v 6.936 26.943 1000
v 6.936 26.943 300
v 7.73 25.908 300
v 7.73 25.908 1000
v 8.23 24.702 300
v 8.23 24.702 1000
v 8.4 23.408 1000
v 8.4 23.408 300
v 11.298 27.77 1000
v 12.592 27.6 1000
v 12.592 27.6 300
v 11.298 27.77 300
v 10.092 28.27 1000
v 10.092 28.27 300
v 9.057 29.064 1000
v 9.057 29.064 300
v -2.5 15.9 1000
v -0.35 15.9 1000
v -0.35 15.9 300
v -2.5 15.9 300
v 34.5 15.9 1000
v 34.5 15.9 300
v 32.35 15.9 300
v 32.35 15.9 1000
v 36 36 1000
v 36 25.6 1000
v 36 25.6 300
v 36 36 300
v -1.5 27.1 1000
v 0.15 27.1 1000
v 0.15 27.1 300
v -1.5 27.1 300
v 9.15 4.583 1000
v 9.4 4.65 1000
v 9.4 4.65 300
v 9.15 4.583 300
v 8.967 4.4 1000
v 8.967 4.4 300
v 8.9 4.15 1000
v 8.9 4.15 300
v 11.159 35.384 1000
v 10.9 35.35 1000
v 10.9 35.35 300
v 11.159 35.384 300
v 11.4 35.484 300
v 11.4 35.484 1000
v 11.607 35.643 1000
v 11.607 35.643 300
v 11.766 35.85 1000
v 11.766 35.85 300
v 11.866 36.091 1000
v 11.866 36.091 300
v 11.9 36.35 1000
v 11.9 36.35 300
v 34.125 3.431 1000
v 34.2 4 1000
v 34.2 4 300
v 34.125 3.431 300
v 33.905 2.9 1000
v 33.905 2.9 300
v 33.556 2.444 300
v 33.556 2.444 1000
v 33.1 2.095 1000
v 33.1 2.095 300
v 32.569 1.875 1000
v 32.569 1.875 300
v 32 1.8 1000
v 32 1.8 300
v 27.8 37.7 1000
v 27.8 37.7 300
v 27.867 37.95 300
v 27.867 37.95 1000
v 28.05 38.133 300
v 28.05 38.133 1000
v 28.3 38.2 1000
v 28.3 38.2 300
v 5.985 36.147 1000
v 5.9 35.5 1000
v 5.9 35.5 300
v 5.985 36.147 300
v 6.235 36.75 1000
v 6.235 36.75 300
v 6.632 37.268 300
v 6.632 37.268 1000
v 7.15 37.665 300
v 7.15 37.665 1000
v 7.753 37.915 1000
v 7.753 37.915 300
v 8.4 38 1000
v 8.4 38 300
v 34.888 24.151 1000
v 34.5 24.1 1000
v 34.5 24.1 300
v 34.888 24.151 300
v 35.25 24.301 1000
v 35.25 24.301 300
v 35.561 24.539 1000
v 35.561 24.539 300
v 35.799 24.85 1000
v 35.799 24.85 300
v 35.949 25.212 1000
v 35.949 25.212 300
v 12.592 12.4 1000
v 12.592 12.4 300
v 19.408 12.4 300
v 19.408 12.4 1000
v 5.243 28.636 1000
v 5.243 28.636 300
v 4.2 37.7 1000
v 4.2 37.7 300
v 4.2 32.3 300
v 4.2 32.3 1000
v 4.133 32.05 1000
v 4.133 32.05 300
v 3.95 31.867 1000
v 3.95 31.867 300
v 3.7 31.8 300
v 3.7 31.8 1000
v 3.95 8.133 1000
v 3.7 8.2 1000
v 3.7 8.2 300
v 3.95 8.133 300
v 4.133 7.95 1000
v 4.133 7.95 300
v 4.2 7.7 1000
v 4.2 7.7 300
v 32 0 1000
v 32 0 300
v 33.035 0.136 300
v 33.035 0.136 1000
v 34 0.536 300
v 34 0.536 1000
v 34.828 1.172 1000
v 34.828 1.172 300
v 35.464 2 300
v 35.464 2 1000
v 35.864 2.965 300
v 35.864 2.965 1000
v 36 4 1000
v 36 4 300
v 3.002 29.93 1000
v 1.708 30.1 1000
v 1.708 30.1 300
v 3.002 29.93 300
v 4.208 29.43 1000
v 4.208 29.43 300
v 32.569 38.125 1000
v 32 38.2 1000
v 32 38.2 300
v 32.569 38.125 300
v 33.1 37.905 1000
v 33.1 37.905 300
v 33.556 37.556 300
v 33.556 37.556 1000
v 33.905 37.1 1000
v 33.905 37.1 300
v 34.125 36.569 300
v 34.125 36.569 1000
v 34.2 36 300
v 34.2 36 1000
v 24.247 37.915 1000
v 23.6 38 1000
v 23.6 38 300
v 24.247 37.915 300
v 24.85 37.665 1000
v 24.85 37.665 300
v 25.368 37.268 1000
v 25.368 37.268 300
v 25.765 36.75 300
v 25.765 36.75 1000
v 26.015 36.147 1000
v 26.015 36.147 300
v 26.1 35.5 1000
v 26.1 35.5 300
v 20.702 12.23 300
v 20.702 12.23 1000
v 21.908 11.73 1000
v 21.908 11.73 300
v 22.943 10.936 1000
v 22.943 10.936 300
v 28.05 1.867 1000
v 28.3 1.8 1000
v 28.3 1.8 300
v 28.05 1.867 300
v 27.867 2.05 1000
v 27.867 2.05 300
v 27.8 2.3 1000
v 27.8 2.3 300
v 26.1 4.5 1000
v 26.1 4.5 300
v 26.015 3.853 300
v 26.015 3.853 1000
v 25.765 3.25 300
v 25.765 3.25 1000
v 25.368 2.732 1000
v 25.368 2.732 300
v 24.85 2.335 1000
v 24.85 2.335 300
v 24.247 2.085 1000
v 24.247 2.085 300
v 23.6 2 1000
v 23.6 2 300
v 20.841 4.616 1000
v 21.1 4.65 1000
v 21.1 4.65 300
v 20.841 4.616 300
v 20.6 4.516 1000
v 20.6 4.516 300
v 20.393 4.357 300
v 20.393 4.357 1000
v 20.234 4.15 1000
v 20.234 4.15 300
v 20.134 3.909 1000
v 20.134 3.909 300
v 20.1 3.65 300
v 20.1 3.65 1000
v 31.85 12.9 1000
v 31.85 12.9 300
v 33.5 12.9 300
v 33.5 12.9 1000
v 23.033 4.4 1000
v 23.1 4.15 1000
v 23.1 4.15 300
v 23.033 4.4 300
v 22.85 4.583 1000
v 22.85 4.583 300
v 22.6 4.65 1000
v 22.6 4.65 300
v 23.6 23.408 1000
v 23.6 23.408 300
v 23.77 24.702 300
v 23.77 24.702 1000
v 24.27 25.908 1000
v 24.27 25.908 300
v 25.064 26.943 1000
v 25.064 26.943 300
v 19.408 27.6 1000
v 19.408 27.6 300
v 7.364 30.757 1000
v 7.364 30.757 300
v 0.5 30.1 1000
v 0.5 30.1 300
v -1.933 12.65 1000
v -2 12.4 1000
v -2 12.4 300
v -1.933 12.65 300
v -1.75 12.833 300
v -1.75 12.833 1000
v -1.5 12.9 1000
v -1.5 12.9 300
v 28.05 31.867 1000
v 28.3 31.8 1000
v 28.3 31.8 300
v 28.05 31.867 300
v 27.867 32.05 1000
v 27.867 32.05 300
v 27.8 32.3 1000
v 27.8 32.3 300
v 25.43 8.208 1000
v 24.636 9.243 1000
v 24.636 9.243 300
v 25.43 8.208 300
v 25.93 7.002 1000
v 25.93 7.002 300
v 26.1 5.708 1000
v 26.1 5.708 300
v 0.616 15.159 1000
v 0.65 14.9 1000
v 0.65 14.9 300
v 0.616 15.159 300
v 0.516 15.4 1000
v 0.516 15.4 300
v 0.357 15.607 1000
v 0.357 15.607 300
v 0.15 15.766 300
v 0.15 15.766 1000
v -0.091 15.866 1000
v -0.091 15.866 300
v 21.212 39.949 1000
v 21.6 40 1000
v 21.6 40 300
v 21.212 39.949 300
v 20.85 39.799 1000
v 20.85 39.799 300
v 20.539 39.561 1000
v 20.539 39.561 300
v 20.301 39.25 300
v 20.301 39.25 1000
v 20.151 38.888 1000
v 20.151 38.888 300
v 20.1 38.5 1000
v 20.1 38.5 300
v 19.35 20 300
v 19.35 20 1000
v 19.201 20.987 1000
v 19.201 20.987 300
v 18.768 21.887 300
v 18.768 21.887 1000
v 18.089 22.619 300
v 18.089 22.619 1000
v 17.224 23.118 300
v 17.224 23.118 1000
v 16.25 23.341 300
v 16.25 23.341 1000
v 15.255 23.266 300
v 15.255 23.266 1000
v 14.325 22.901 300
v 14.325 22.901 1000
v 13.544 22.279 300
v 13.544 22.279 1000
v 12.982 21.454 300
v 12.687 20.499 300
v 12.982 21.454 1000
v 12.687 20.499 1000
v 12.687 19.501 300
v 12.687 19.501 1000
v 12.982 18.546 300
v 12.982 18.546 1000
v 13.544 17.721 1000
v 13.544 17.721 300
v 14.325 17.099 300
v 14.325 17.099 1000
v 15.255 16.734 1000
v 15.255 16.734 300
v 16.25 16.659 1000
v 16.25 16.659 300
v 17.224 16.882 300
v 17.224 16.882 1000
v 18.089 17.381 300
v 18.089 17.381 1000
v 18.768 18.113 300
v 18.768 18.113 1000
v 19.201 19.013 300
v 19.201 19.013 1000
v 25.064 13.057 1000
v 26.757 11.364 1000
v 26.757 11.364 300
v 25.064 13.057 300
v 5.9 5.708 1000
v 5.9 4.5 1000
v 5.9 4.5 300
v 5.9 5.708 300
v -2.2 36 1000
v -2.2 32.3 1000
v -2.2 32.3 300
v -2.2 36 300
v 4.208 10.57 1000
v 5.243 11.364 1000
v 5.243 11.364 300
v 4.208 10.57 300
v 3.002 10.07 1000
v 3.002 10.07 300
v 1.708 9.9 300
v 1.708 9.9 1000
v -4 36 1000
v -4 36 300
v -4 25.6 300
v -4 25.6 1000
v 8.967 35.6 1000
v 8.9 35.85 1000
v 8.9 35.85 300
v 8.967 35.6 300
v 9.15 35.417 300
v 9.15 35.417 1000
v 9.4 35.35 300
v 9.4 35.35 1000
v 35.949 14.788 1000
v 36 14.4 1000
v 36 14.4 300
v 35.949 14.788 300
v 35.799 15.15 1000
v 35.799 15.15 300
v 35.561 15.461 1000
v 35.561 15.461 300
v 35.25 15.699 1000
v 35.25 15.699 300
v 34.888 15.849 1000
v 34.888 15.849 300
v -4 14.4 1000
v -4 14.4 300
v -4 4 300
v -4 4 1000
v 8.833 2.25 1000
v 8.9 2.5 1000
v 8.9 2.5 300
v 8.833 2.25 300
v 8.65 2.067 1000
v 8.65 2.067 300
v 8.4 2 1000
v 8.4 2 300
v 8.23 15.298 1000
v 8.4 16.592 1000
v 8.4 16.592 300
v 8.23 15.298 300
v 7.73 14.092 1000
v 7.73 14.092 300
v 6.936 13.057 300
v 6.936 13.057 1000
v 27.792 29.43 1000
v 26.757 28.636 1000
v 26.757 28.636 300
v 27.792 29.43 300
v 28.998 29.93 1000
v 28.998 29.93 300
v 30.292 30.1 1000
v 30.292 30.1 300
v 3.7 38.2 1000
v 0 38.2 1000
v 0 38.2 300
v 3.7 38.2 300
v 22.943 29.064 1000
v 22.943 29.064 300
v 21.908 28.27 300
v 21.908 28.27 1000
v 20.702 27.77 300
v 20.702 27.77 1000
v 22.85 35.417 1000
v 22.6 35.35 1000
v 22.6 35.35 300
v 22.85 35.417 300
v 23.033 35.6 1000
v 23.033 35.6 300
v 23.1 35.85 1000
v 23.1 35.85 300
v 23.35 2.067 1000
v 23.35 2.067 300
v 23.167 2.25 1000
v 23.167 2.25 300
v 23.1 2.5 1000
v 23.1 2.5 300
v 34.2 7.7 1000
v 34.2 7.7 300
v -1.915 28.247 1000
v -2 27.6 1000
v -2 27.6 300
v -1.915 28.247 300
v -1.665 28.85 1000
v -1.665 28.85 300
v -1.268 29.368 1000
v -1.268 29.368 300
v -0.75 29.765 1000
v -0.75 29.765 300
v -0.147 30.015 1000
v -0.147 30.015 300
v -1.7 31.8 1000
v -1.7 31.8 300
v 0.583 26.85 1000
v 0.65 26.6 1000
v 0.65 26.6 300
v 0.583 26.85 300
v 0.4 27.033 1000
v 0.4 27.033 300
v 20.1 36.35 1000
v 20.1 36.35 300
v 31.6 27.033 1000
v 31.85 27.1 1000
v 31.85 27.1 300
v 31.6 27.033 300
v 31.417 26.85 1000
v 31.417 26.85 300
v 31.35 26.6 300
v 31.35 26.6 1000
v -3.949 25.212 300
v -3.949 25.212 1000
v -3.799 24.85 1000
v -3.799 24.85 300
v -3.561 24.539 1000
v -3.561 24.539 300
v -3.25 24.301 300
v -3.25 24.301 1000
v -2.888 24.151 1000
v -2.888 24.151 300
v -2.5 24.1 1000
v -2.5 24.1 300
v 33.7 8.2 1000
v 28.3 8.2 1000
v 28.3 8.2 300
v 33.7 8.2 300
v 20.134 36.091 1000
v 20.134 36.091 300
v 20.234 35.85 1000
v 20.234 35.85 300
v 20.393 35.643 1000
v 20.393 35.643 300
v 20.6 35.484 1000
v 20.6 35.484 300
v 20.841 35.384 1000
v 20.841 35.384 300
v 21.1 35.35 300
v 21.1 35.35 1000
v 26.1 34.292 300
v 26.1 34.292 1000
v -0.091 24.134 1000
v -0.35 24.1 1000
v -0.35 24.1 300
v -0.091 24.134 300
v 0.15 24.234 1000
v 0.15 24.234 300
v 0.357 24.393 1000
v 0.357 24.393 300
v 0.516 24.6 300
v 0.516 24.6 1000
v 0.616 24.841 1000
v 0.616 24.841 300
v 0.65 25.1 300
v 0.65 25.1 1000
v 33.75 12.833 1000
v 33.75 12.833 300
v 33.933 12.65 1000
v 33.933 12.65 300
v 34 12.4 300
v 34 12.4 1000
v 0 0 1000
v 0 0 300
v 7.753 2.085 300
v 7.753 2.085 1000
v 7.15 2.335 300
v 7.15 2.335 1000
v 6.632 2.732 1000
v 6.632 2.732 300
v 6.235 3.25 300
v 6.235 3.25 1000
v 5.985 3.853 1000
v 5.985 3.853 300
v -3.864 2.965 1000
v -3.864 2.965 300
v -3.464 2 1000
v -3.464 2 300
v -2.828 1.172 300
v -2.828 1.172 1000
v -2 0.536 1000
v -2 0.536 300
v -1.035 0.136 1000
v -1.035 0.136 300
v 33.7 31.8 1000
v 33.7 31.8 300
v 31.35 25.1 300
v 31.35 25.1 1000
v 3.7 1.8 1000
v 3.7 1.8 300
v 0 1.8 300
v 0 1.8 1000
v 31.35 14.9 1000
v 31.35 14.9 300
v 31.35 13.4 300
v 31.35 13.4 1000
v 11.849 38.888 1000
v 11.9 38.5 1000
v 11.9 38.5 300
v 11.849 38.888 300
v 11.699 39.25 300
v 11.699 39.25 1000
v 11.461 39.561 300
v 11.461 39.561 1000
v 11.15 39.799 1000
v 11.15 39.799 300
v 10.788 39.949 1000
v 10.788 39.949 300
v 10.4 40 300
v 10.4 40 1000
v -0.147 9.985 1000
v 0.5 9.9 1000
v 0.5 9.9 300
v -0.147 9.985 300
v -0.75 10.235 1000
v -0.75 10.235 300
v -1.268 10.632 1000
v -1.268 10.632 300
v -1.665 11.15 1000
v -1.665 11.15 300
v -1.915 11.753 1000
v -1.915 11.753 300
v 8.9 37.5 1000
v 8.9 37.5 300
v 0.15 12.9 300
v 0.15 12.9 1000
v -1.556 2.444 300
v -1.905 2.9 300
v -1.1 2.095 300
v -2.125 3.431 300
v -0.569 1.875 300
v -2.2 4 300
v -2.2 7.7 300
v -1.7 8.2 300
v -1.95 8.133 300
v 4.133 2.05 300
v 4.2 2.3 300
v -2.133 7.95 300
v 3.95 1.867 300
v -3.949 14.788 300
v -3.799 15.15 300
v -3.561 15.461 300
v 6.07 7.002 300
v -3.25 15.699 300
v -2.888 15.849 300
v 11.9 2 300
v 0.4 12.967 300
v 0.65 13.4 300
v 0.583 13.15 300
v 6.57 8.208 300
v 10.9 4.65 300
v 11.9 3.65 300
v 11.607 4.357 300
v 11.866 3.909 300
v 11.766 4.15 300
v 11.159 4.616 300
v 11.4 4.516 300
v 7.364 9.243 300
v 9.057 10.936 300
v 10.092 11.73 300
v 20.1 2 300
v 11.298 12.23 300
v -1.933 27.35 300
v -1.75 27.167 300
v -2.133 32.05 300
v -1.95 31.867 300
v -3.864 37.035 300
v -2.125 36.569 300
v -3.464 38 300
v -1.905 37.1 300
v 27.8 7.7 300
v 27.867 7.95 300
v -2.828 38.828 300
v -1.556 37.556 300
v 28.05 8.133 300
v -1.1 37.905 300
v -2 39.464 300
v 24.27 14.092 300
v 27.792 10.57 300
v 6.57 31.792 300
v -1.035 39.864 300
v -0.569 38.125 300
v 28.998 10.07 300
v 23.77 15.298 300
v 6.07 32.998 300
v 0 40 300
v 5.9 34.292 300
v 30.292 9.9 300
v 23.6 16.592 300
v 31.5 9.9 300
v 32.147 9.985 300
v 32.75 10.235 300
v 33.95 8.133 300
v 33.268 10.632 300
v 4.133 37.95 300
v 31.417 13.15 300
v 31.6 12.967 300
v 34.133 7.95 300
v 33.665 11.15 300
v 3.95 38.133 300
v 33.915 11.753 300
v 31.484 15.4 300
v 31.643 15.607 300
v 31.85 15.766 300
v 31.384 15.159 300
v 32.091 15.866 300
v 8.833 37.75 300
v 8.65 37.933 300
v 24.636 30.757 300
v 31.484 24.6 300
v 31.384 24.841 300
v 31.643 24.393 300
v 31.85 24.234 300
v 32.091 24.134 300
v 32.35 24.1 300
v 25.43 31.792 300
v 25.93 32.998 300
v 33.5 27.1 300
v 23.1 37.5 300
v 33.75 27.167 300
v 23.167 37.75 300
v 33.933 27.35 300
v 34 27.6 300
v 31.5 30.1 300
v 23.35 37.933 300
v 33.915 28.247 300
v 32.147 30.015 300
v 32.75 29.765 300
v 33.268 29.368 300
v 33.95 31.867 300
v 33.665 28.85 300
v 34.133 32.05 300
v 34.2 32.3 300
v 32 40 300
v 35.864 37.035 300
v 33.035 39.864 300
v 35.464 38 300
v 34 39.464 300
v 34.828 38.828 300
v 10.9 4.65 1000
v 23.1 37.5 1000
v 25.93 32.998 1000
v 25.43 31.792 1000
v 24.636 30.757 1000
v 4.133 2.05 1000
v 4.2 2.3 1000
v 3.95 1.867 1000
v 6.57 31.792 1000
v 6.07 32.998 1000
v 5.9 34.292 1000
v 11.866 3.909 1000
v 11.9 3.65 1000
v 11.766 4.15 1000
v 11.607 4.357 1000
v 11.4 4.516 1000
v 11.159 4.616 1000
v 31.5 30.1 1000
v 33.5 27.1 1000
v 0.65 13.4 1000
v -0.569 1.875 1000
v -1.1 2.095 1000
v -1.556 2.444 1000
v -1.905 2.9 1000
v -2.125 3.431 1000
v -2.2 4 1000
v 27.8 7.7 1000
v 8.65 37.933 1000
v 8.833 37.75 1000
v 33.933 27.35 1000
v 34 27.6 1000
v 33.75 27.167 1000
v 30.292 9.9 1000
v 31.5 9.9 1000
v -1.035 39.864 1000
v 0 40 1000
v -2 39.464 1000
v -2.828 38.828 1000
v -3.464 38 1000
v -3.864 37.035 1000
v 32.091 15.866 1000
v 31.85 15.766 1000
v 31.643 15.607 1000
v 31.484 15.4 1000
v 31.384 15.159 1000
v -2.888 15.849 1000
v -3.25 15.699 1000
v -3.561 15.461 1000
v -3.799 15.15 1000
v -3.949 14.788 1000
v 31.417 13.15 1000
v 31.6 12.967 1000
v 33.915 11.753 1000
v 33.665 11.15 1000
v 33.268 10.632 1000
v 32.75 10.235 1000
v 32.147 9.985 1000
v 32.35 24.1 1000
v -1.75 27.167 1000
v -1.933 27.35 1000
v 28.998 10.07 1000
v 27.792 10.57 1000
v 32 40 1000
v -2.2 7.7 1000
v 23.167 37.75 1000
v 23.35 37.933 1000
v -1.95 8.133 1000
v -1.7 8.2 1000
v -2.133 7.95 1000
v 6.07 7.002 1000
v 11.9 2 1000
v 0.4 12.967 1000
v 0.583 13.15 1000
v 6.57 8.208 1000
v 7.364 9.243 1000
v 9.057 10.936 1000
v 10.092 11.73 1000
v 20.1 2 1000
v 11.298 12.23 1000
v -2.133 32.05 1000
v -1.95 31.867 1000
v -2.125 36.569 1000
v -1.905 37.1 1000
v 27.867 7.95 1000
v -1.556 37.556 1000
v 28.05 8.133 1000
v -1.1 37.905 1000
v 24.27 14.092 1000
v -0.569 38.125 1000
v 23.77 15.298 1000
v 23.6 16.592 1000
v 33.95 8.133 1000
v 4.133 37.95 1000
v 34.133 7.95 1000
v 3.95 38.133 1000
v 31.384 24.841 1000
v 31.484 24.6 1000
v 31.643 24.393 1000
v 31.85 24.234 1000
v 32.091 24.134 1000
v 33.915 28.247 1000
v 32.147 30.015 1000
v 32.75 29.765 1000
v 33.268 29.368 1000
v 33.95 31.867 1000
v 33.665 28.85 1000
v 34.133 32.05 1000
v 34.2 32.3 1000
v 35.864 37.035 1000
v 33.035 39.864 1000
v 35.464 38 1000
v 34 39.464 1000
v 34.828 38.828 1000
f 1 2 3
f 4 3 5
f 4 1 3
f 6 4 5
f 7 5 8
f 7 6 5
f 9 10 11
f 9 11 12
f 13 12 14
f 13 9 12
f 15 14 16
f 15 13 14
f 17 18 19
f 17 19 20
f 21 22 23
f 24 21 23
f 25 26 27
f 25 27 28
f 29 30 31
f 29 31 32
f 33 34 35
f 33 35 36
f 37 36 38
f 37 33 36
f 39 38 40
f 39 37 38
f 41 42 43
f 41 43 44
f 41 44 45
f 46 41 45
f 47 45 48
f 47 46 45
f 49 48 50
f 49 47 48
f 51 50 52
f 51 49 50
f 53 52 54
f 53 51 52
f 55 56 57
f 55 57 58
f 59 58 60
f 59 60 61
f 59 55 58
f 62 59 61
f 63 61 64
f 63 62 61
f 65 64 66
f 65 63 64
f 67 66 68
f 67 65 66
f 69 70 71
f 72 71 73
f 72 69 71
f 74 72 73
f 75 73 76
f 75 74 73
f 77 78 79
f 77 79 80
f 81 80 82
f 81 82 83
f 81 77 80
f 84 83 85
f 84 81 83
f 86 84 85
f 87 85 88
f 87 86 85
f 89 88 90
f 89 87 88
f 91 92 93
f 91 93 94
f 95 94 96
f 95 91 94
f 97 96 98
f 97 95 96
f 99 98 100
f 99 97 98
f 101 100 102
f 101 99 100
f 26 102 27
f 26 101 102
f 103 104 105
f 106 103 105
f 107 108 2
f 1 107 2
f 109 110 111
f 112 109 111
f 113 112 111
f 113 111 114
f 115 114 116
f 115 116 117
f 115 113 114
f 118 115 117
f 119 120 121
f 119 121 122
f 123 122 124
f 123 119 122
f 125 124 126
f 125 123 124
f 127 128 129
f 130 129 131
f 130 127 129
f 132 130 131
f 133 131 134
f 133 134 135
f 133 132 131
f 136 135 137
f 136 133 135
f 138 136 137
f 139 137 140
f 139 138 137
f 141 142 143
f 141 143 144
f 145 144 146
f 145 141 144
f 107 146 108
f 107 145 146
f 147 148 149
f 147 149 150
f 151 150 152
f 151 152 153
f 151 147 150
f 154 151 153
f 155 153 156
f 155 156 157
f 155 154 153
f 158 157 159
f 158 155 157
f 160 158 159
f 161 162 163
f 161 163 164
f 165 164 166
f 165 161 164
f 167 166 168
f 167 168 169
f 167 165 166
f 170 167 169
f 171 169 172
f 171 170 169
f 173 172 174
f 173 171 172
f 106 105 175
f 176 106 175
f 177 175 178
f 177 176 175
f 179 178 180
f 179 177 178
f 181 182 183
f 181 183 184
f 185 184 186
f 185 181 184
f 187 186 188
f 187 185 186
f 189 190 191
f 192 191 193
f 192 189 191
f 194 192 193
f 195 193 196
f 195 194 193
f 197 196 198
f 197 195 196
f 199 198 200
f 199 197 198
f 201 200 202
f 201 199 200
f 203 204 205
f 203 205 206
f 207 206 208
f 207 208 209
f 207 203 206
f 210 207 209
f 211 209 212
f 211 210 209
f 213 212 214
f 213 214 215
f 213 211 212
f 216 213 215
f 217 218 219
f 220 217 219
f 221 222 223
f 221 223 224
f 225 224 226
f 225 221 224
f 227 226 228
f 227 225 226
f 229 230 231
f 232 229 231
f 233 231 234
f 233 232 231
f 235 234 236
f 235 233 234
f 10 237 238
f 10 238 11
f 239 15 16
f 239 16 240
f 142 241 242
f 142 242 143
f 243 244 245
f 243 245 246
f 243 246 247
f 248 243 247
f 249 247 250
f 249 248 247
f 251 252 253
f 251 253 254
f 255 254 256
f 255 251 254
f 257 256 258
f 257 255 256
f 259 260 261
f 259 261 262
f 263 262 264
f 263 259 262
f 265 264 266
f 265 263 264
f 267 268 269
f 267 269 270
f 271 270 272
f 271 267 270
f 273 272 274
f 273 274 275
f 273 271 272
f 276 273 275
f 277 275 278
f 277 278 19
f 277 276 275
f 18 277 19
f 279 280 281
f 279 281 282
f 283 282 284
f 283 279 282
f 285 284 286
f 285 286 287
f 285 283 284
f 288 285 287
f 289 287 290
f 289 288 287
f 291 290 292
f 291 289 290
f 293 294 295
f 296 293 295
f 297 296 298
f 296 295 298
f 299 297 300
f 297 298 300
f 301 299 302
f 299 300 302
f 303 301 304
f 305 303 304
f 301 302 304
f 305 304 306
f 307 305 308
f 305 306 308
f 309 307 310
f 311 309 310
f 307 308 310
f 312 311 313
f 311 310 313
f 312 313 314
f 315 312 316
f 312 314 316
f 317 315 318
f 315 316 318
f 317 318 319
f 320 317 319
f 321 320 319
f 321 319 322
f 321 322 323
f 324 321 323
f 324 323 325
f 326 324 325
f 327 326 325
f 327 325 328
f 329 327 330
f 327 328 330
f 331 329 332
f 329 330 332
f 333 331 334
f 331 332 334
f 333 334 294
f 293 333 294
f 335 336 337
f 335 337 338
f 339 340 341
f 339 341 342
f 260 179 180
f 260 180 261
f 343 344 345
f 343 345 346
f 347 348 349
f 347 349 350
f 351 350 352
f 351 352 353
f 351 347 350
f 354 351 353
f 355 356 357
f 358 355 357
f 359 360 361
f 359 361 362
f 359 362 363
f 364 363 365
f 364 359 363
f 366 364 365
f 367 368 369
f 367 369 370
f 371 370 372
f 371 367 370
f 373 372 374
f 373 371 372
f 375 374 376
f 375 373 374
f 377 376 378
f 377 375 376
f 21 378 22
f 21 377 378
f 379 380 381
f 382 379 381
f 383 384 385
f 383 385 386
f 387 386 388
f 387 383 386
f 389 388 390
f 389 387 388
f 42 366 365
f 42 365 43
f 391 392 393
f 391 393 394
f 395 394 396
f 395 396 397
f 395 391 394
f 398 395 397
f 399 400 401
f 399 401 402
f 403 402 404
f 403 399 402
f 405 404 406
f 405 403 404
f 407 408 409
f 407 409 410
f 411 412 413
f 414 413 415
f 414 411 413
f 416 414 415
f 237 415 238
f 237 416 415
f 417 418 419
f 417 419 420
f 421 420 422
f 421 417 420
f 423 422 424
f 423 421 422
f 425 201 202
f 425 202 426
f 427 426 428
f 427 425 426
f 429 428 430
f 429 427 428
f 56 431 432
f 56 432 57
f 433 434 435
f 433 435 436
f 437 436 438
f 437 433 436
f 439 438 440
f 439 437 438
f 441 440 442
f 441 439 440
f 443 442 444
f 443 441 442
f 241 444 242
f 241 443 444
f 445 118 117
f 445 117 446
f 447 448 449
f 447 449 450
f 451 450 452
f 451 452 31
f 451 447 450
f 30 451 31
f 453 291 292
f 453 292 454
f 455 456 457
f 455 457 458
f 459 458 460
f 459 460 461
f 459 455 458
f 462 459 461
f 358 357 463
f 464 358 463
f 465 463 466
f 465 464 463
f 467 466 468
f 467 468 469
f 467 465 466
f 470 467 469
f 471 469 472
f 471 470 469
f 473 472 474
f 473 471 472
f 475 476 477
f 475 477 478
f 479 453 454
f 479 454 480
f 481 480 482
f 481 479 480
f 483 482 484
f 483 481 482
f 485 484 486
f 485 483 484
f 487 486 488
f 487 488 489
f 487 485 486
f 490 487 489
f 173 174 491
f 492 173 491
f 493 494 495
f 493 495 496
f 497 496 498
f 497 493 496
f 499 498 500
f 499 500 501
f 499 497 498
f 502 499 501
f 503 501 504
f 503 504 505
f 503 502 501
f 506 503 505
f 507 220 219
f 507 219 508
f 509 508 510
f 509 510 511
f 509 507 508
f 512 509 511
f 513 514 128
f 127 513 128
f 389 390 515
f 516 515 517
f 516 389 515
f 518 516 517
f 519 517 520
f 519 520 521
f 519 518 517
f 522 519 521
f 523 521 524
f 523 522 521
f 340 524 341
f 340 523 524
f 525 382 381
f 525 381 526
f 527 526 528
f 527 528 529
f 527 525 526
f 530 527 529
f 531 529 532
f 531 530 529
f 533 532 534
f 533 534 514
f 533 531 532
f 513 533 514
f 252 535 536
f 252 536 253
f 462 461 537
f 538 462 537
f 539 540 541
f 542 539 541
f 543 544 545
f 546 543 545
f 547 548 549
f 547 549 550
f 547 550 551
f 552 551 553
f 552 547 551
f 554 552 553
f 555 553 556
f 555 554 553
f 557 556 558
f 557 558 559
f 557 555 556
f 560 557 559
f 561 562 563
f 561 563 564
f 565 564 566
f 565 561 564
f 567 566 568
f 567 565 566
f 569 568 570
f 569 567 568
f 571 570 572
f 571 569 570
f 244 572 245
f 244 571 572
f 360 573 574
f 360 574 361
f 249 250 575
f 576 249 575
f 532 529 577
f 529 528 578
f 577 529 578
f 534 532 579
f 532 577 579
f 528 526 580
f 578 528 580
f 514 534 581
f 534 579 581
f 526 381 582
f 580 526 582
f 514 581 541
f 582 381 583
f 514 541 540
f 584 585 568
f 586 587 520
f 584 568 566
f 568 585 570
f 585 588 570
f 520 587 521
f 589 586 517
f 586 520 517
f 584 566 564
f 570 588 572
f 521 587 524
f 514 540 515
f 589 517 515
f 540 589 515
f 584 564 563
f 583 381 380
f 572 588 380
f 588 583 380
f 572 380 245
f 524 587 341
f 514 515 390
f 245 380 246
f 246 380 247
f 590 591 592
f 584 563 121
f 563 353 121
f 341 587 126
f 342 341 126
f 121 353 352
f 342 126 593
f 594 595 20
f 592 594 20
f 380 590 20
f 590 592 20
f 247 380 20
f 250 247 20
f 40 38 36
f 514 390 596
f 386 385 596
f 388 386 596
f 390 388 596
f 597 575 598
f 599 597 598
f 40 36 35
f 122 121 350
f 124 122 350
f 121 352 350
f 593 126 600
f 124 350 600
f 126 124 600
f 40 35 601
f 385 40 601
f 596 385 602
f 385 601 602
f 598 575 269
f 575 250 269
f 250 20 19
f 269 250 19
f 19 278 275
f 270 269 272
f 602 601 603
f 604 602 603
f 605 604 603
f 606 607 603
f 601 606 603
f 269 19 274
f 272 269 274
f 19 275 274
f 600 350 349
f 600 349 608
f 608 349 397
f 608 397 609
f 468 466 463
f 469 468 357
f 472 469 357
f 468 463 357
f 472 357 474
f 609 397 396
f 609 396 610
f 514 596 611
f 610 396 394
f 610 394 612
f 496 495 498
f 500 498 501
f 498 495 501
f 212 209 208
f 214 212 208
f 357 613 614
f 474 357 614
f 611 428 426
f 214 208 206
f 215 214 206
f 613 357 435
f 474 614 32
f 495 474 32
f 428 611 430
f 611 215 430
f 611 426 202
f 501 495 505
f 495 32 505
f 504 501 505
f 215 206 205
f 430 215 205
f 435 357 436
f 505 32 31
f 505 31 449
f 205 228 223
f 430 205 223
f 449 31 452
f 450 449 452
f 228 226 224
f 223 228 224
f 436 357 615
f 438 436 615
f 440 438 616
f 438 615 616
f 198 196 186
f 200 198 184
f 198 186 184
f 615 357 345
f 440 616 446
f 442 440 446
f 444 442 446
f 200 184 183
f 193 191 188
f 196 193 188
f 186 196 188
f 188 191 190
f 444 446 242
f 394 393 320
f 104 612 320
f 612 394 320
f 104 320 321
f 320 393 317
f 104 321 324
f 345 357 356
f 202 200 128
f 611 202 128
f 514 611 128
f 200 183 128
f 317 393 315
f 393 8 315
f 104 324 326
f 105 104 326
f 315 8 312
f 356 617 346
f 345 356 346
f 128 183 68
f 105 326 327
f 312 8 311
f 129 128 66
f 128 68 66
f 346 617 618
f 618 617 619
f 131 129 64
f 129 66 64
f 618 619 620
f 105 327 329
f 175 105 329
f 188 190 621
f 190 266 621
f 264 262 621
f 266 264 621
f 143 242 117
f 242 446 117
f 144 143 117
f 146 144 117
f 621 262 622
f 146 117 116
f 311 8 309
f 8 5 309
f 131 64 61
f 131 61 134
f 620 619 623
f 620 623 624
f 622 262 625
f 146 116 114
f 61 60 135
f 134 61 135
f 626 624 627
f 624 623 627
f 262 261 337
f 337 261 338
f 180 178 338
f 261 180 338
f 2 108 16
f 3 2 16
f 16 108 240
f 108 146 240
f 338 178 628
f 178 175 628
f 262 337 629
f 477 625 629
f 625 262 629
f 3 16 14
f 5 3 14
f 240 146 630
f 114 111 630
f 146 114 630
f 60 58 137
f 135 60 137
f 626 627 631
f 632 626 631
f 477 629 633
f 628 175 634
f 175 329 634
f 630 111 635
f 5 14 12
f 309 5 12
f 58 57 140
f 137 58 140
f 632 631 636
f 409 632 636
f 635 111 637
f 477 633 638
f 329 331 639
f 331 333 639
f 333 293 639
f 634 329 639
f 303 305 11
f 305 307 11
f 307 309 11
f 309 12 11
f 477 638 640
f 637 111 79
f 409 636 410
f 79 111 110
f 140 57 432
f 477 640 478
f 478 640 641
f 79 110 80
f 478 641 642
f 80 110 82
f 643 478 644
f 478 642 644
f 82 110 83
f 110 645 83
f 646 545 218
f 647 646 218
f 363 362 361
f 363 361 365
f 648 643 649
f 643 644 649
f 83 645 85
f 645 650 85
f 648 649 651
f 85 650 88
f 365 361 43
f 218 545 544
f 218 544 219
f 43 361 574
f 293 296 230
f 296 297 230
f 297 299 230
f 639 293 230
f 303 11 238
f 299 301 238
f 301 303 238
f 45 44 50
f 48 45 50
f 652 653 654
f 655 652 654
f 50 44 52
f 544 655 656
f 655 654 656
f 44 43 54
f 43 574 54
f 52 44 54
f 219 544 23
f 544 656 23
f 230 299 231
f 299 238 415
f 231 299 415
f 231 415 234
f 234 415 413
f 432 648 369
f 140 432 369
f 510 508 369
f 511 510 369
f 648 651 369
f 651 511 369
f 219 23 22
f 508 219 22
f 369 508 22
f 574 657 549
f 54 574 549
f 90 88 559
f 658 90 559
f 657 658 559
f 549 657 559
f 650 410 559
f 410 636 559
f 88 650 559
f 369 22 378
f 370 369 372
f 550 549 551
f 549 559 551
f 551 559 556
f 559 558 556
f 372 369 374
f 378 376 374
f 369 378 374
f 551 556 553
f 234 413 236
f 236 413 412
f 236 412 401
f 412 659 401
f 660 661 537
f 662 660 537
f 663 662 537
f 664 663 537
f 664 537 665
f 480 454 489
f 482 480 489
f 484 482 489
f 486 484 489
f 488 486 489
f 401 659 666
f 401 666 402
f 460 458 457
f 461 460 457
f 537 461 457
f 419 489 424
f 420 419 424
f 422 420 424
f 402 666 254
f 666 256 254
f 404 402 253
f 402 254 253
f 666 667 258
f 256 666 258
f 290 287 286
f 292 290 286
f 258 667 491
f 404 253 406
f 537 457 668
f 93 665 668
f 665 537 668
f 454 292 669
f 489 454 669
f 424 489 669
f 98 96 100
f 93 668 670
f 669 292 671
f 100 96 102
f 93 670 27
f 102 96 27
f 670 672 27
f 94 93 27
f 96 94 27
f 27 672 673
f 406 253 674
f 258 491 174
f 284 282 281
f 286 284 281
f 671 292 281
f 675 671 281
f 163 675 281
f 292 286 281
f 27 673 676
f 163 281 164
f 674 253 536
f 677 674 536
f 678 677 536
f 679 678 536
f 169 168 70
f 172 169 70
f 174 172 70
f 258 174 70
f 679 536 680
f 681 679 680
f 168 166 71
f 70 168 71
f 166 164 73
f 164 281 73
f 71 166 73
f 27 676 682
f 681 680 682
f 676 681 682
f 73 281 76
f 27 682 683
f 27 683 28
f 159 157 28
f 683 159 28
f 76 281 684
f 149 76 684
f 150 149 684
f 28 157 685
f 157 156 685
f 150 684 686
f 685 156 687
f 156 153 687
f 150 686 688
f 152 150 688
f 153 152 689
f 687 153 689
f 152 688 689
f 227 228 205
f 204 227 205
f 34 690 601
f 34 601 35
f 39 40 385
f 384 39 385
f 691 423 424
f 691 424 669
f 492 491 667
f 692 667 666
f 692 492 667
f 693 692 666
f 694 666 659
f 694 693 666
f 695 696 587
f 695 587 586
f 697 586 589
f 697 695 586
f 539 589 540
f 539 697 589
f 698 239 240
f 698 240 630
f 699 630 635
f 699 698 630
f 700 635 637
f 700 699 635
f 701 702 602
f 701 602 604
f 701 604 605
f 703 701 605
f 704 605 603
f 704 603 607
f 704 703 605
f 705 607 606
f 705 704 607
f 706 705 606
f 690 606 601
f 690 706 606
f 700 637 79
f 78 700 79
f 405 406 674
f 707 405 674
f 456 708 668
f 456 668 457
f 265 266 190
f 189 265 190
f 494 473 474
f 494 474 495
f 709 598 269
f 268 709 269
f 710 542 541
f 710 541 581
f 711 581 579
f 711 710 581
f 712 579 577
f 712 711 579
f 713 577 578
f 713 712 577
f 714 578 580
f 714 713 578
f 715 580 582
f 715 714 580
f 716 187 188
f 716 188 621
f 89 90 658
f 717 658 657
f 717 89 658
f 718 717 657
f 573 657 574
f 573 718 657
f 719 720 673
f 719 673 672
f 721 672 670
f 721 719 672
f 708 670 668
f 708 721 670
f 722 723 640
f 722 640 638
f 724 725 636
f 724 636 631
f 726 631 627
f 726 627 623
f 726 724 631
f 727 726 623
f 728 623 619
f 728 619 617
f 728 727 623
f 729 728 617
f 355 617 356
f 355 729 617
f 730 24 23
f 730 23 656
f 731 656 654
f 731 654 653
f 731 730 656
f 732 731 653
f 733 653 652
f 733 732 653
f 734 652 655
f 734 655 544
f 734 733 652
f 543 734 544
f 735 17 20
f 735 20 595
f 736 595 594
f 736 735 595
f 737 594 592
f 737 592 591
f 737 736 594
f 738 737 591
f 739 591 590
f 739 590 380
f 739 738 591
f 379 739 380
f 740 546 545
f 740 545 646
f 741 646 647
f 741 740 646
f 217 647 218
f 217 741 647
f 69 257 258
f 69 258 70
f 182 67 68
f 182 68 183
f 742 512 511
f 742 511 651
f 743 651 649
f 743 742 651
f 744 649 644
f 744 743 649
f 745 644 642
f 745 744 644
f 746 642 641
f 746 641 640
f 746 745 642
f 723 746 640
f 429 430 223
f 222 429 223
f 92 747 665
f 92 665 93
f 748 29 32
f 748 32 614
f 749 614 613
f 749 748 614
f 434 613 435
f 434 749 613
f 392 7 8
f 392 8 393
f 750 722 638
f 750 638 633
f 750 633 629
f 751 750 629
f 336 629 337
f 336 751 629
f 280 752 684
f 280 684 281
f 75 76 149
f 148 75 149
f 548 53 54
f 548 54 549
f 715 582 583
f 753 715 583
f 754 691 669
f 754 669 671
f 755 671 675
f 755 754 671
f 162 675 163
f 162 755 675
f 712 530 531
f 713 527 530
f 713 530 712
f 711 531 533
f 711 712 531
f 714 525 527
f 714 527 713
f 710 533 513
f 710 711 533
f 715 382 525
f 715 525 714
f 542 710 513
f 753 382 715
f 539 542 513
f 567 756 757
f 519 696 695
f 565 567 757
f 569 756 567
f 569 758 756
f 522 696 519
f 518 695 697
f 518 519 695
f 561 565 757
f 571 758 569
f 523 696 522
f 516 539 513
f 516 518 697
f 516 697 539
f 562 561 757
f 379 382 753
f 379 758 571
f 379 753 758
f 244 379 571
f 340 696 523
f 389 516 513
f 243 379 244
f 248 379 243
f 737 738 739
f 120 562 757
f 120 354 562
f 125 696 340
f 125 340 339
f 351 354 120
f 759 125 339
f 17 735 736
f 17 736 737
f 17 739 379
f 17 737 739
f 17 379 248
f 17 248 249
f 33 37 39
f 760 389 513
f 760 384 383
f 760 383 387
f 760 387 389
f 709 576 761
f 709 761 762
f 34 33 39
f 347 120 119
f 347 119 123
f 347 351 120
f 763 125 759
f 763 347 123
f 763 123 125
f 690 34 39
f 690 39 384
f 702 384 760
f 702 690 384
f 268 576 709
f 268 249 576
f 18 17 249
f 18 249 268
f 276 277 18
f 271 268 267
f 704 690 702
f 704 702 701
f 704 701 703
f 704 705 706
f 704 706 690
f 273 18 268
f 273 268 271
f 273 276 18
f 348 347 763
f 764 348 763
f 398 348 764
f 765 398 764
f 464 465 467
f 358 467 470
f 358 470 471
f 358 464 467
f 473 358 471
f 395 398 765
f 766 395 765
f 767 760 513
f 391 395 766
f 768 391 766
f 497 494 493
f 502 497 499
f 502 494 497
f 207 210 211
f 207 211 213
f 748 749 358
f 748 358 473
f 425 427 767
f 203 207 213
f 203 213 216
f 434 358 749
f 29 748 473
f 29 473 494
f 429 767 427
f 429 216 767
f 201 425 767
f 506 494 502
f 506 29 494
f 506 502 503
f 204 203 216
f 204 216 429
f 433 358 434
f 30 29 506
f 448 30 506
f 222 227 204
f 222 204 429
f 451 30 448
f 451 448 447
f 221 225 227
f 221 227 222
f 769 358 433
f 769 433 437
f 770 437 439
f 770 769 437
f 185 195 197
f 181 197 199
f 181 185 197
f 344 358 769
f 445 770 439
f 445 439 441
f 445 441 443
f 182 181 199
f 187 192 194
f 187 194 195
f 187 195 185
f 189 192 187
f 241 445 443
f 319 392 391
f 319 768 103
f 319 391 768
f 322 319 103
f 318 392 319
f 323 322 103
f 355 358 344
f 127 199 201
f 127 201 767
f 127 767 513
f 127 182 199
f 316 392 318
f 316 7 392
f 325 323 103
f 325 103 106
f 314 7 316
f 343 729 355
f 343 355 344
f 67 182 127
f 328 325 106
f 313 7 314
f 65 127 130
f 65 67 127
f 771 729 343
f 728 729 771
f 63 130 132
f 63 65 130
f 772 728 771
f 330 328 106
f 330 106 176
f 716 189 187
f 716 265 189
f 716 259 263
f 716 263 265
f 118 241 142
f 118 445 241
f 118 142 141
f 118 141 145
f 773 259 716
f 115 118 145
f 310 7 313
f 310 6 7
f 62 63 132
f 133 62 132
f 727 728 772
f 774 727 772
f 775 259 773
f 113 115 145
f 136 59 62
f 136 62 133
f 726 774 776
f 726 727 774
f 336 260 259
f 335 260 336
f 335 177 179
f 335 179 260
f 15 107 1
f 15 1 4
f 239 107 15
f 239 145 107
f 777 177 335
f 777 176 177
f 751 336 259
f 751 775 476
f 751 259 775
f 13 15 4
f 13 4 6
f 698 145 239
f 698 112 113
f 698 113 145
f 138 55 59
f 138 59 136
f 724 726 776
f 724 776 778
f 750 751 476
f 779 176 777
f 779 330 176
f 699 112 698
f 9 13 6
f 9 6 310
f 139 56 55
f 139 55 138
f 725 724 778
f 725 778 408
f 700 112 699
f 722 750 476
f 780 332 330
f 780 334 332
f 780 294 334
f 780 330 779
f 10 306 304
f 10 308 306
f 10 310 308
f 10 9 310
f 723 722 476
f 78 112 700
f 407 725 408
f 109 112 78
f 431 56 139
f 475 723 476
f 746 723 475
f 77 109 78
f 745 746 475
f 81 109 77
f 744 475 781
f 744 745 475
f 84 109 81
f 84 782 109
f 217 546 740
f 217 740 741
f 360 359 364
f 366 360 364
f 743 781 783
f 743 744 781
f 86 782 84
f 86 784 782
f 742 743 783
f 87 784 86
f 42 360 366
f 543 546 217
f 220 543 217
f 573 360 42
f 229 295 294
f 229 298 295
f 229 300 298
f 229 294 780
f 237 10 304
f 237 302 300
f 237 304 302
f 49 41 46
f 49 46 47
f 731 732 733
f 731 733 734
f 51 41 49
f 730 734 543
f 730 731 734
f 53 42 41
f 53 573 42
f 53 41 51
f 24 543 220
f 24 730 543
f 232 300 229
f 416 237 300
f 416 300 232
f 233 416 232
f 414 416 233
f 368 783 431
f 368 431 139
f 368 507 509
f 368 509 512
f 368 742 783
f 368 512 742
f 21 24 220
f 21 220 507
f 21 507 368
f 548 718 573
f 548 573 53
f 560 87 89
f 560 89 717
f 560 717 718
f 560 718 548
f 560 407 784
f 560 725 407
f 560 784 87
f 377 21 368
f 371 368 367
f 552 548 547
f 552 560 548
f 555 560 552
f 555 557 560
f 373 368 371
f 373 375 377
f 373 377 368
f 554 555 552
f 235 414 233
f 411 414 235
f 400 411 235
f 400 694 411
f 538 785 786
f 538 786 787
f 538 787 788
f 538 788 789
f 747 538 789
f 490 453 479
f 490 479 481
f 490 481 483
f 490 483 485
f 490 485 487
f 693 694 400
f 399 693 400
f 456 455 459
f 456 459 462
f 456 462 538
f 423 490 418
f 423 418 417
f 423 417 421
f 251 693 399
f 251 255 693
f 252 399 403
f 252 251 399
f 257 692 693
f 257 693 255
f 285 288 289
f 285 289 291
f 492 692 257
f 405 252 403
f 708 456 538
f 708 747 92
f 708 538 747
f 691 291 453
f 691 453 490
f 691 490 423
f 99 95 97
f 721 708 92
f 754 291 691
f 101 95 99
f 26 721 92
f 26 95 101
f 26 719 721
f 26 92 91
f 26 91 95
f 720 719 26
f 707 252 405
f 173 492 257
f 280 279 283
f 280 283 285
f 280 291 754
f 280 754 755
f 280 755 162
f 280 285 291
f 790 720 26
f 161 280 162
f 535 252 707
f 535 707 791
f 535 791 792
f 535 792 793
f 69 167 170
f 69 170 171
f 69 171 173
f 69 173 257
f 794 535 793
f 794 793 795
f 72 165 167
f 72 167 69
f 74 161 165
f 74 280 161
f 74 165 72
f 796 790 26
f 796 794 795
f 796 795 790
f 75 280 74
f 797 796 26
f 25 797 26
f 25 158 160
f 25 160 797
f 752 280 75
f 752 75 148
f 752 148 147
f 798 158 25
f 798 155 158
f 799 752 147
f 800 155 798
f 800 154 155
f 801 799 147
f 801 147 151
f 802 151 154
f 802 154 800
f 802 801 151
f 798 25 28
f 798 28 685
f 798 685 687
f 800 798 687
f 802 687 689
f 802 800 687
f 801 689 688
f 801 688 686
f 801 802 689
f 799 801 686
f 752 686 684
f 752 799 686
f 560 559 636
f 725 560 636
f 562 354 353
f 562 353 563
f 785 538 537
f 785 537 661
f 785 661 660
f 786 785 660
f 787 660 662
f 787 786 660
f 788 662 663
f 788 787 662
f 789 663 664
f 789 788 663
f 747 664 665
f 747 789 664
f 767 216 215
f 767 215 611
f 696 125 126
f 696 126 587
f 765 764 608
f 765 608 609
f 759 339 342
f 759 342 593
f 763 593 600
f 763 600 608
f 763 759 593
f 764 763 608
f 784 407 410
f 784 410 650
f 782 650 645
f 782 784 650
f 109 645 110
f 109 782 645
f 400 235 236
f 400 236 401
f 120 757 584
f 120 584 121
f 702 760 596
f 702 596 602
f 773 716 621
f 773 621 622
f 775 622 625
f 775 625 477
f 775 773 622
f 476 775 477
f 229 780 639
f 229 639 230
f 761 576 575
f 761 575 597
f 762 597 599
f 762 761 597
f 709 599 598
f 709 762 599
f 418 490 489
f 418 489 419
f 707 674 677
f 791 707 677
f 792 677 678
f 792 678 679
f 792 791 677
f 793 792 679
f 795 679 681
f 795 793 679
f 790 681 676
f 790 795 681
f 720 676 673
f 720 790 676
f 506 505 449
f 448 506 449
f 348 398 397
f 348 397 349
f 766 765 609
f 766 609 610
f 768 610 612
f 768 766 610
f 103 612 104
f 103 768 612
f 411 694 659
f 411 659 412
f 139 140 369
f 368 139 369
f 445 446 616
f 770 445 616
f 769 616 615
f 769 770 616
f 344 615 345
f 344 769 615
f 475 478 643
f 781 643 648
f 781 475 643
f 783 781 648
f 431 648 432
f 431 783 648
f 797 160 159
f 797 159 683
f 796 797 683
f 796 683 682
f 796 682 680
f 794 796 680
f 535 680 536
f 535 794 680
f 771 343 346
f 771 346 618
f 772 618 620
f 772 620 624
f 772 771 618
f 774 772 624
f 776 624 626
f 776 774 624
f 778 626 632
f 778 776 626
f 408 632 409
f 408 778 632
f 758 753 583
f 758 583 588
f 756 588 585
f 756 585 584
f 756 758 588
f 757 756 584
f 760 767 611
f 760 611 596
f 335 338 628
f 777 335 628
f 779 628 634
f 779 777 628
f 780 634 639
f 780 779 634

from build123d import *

# Parameters (mm, degrees)
SKIZZE1_R                       = 3.35
AUFSATZ_LINEAR_AUSTRAGEN1_DEPTH = 700


with BuildPart() as part:
    # Skizze1 → Aufsatz-Linear austragen1 (new body)
    with BuildSketch(Plane.XY.offset(1000)):
        with BuildLine():
            Line((5.899999985, 34.292388165), (5.899999985, 35.500000003))
            ThreePointArc((5.899999985, 35.500000003), (6.632233037, 37.267766961), (8.399999999, 38.000000003))
            ThreePointArc((8.399999999, 38.000000003), (8.753553388, 37.853553393), (8.899999996, 37.500000003))
            Line((8.899999996, 37.500000003), (8.899999996, 35.850000004))
            ThreePointArc((8.899999996, 35.850000004), (9.046446605, 35.496446613), (9.399999996, 35.350000004))
            Line((9.399999996, 35.350000004), (10.899999947, 35.350000004))
            ThreePointArc((10.899999947, 35.350000004), (11.607106728, 35.642893223), (11.899999947, 36.350000004))
            Line((11.899999947, 36.350000004), (11.899999947, 38.500000016))
            ThreePointArc((11.899999947, 38.500000016), (11.460660119, 39.560660188), (10.399999947, 40.000000016))
            Line((10.399999947, 40.000000016), (5.2e-08, 40.000000016))
            ThreePointArc((5.2e-08, 40.000000016), (-2.828427117, 38.828427123), (-4.000000011, 35.999999954))
            Line((-4.000000011, 35.999999954), (-4.000000011, 25.599999996))
            ThreePointArc((-4.000000011, 25.599999996), (-3.560660183, 24.539339825), (-2.500000012, 24.099999997))
            Line((-2.500000012, 24.099999997), (-0.350000011, 24.099999997))
            ThreePointArc((-0.350000011, 24.099999997), (0.35710677, 24.392893216), (0.649999989, 25.099999997))
            Line((0.649999989, 25.099999997), (0.649999989, 26.599999997))
            ThreePointArc((0.649999989, 26.599999997), (0.50355338, 26.953553387), (0.149999989, 27.099999997))
            Line((0.149999989, 27.099999997), (-1.500000011, 27.099999997))
            ThreePointArc((-1.500000011, 27.099999997), (-1.853553401, 27.246446605), (-2.000000011, 27.599999993))
            ThreePointArc((-2.000000011, 27.599999993), (-1.26776697, 29.367766957), (0.499999989, 30.10000001))
            Line((0.499999989, 30.10000001), (1.707611833, 30.10000001))
            ThreePointArc((1.707611833, 30.10000001), (3.621028995, 29.719397673), (5.243145739, 28.635533916))
            Line((5.243145739, 28.635533916), (6.935533894, 26.943145761))
            ThreePointArc((6.935533894, 26.943145761), (8.01939765, 25.321029017), (8.399999988, 23.407611855))
            Line((8.399999988, 23.407611855), (8.399999988, 16.592388122))
            ThreePointArc((8.399999988, 16.592388122), (8.01939765, 14.678970961), (6.935533894, 13.056854217))
            Line((6.935533894, 13.056854217), (5.243145737, 11.36446606))
            ThreePointArc((5.243145737, 11.36446606), (3.621028993, 10.280602303), (1.707611831, 9.899999966))
            Line((1.707611831, 9.899999966), (0.49999999, 9.899999966))
            ThreePointArc((0.49999999, 9.899999966), (-1.267766968, 10.632233018), (-2.00000001, 12.399999979))
            ThreePointArc((-2.00000001, 12.399999979), (-1.8535534, 12.753553368), (-1.50000001, 12.899999977))
            Line((-1.50000001, 12.899999977), (0.149999989, 12.899999977))
            ThreePointArc((0.149999989, 12.899999977), (0.50355338, 13.046446586), (0.649999989, 13.399999977))
            Line((0.649999989, 13.399999977), (0.649999989, 14.899999976))
            ThreePointArc((0.649999989, 14.899999976), (0.35710677, 15.607106757), (-0.350000011, 15.899999976))
            Line((-0.350000011, 15.899999976), (-2.50000001, 15.899999976))
            ThreePointArc((-2.50000001, 15.899999976), (-3.560660182, 15.460660148), (-4.000000011, 14.399999976))
            Line((-4.000000011, 14.399999976), (-4.000000011, 4.000000069))
            ThreePointArc((-4.000000011, 4.000000069), (-2.828427121, 1.171572909), (4e-08, 1.9e-08))
            Line((4e-08, 1.9e-08), (31.999999925, 1.9e-08))
            ThreePointArc((31.999999925, 1.9e-08), (34.828427086, 1.171572909), (35.999999976, 4.00000007))
            Line((35.999999976, 4.00000007), (35.999999976, 14.399999977))
            ThreePointArc((35.999999976, 14.399999977), (35.560660149, 15.460660148), (34.499999978, 15.899999976))
            Line((34.499999978, 15.899999976), (32.349999991, 15.899999976))
            ThreePointArc((32.349999991, 15.899999976), (31.642893209, 15.607106757), (31.34999999, 14.899999976))
            Line((31.34999999, 14.899999976), (31.34999999, 13.399999977))
            ThreePointArc((31.34999999, 13.399999977), (31.4964466, 13.046446586), (31.84999999, 12.899999977))
            Line((31.84999999, 12.899999977), (33.499999991, 12.899999977))
            ThreePointArc((33.499999991, 12.899999977), (33.853553381, 12.753553368), (33.999999991, 12.399999979))
            ThreePointArc((33.999999991, 12.399999979), (33.267766949, 10.632233018), (31.499999991, 9.899999966))
            Line((31.499999991, 9.899999966), (30.292388185, 9.899999966))
            ThreePointArc((30.292388185, 9.899999966), (28.378971023, 10.280602303), (26.756854279, 11.36446606))
            Line((26.756854279, 11.36446606), (25.064466082, 13.056854257))
            ThreePointArc((25.064466082, 13.056854257), (23.980602325, 14.678971001), (23.599999988, 16.592388163))
            Line((23.599999988, 16.592388163), (23.599999988, 23.407611842))
            ThreePointArc((23.599999988, 23.407611842), (23.980602325, 25.321029004), (25.064466082, 26.943145747))
            Line((25.064466082, 26.943145747), (26.75685425, 28.635533916))
            ThreePointArc((26.75685425, 28.635533916), (28.378970995, 29.719397673), (30.292388156, 30.10000001))
            Line((30.292388156, 30.10000001), (31.499999989, 30.10000001))
            ThreePointArc((31.499999989, 30.10000001), (33.267766948, 29.367766957), (33.999999989, 27.599999993))
            ThreePointArc((33.999999989, 27.599999993), (33.853553379, 27.246446605), (33.499999989, 27.099999997))
            Line((33.499999989, 27.099999997), (31.84999999, 27.099999997))
            ThreePointArc((31.84999999, 27.099999997), (31.4964466, 26.953553387), (31.34999999, 26.599999997))
            Line((31.34999999, 26.599999997), (31.34999999, 25.099999997))
            ThreePointArc((31.34999999, 25.099999997), (31.642893209, 24.392893216), (32.34999999, 24.099999997))
            Line((32.34999999, 24.099999997), (34.499999976, 24.099999997))
            ThreePointArc((34.499999976, 24.099999997), (35.560660148, 24.539339825), (35.999999976, 25.599999997))
            Line((35.999999976, 25.599999997), (35.999999976, 35.999999953))
            ThreePointArc((35.999999976, 35.999999953), (34.828427083, 38.828427123), (31.999999914, 40.000000016))
            Line((31.999999914, 40.000000016), (21.600000015, 40.000000016))
            ThreePointArc((21.600000015, 40.000000016), (20.539339844, 39.560660188), (20.100000016, 38.500000017))
            Line((20.100000016, 38.500000017), (20.100000016, 36.350000004))
            ThreePointArc((20.100000016, 36.350000004), (20.392893235, 35.642893223), (21.100000017, 35.350000004))
            Line((21.100000017, 35.350000004), (22.600000014, 35.350000004))
            ThreePointArc((22.600000014, 35.350000004), (22.953553405, 35.496446613), (23.100000014, 35.850000004))
            Line((23.100000014, 35.850000004), (23.100000014, 37.500000007))
            ThreePointArc((23.100000014, 37.500000007), (23.246446625, 37.8535534), (23.600000019, 38.000000007))
            ThreePointArc((23.600000019, 38.000000007), (25.367766955, 37.267766951), (26.099999992, 35.500000007))
            Line((26.099999992, 35.500000007), (26.099999992, 34.292388127))
            ThreePointArc((26.099999992, 34.292388127), (25.719397655, 32.378970966), (24.635533898, 30.756854221))
            Line((24.635533898, 30.756854221), (22.943145779, 29.064466103))
            ThreePointArc((22.943145779, 29.064466103), (21.321029035, 27.980602346), (19.407611873, 27.600000009))
            Line((19.407611873, 27.600000009), (12.592388142, 27.600000009))
            ThreePointArc((12.592388142, 27.600000009), (10.678970981, 27.980602346), (9.056854237, 29.064466102))
            Line((9.056854237, 29.064466102), (7.36446608, 30.75685426))
            ThreePointArc((7.36446608, 30.75685426), (6.280602323, 32.378971004), (5.899999985, 34.292388165))
        make_face()
        with Locations((15.999999985, 20)):
            Circle(SKIZZE1_R, mode=Mode.SUBTRACT)
        with BuildLine():
            Line((27.799999996, 32.299999708), (27.799999996, 37.700000083))
            ThreePointArc((27.799999996, 37.700000083), (27.946446591, 38.053553439), (28.299999947, 38.200000034))
            Line((28.299999947, 38.200000034), (31.999999914, 38.200000034))
            ThreePointArc((31.999999914, 38.200000034), (33.555634889, 37.555634929), (34.199999994, 35.999999953))
            Line((34.199999994, 35.999999953), (34.199999994, 32.300000046))
            ThreePointArc((34.199999994, 32.300000046), (34.053553382, 31.946446648), (33.699999983, 31.800000035))
            Line((33.699999983, 31.800000035), (28.299999669, 31.800000035))
            ThreePointArc((28.299999669, 31.800000035), (27.94644651, 31.946446549), (27.799999996, 32.299999708))
        make_face(mode=Mode.SUBTRACT)
        with BuildLine():
            Line((28.299999669, 8.199999998), (33.700000043, 8.199999998))
            ThreePointArc((33.700000043, 8.199999998), (34.053553399, 8.053553402), (34.199999994, 7.700000046))
            Line((34.199999994, 7.700000046), (34.199999994, 4.00000007))
            ThreePointArc((34.199999994, 4.00000007), (33.555634893, 2.444365103), (31.999999925, 1.800000001))
            Line((31.999999925, 1.800000001), (28.300000007, 1.800000001))
            ThreePointArc((28.300000007, 1.800000001), (27.946446609, 1.946446613), (27.799999996, 2.300000012))
            Line((27.799999996, 2.300000012), (27.799999996, 7.700000324))
            ThreePointArc((27.799999996, 7.700000324), (27.94644651, 8.053553484), (28.299999669, 8.199999998))
        make_face(mode=Mode.SUBTRACT)
        with BuildLine():
            Line((3.700000285, 31.800000035), (-1.700000077, 31.800000035))
            ThreePointArc((-1.700000077, 31.800000035), (-2.053553433, 31.94644663), (-2.200000029, 32.299999986))
            Line((-2.200000029, 32.299999986), (-2.200000029, 35.999999954))
            ThreePointArc((-2.200000029, 35.999999954), (-1.555634924, 37.555634929), (5.2e-08, 38.200000034))
            Line((5.2e-08, 38.200000034), (3.699999947, 38.200000034))
            ThreePointArc((3.699999947, 38.200000034), (4.053553346, 38.053553422), (4.199999959, 37.700000023))
            Line((4.199999959, 37.700000023), (4.199999959, 32.299999708))
            ThreePointArc((4.199999959, 32.299999708), (4.053553445, 31.946446549), (3.700000285, 31.800000035))
        make_face(mode=Mode.SUBTRACT)
        with BuildLine():
            Line((4.199999959, 7.700000324), (4.199999959, 2.299999952))
            ThreePointArc((4.199999959, 2.299999952), (4.053553363, 1.946446596), (3.700000007, 1.800000001))
            Line((3.700000007, 1.800000001), (4e-08, 1.800000001))
            ThreePointArc((4e-08, 1.800000001), (-1.555634927, 2.444365102), (-2.200000029, 4.000000069))
            Line((-2.200000029, 4.000000069), (-2.200000029, 7.699999986))
            ThreePointArc((-2.200000029, 7.699999986), (-2.053553416, 8.053553385), (-1.700000017, 8.199999998))
            Line((-1.700000017, 8.199999998), (3.700000285, 8.199999998))
            ThreePointArc((3.700000285, 8.199999998), (4.053553445, 8.053553484), (4.199999959, 7.700000324))
        make_face(mode=Mode.SUBTRACT)
        with BuildLine():
            Line((20.100000016, 2.000000008), (11.899999947, 2.000000008))
            Line((11.899999947, 2.000000008), (11.899999947, 3.649999992))
            ThreePointArc((11.899999947, 3.649999992), (11.607106728, 4.357106773), (10.899999947, 4.649999992))
            Line((10.899999947, 4.649999992), (9.399999996, 4.649999992))
            ThreePointArc((9.399999996, 4.649999992), (9.046446606, 4.503553382), (8.899999996, 4.149999992))
            Line((8.899999996, 4.149999992), (8.899999996, 2.499999991))
            ThreePointArc((8.899999996, 2.499999991), (8.753553389, 2.146446604), (8.400000003, 1.999999994))
            ThreePointArc((8.400000003, 1.999999994), (6.632233039, 2.732233035), (5.899999985, 4.499999994))
            Line((5.899999985, 4.499999994), (5.899999985, 5.707611838))
            ThreePointArc((5.899999985, 5.707611838), (6.280602323, 7.621029001), (7.36446608, 9.243145746))
            Line((7.36446608, 9.243145746), (9.056854238, 10.935533903))
            ThreePointArc((9.056854238, 10.935533903), (10.678970982, 12.01939766), (12.592388143, 12.399999997))
            Line((12.592388143, 12.399999997), (19.407611847, 12.399999997))
            ThreePointArc((19.407611847, 12.399999997), (21.321029008, 12.01939766), (22.943145752, 10.935533904))
            Line((22.943145752, 10.935533904), (24.635533898, 9.243145757))
            ThreePointArc((24.635533898, 9.243145757), (25.719397655, 7.621029013), (26.099999992, 5.707611851))
            Line((26.099999992, 5.707611851), (26.099999992, 4.499999993))
            ThreePointArc((26.099999992, 4.499999993), (25.367766954, 2.73223305), (23.600000019, 1.999999995))
            ThreePointArc((23.600000019, 1.999999995), (23.246446625, 2.146446603), (23.100000014, 2.499999995))
            Line((23.100000014, 2.499999995), (23.100000014, 4.149999994))
            ThreePointArc((23.100000014, 4.149999994), (22.953553405, 4.503553383), (22.600000016, 4.649999992))
            Line((22.600000016, 4.649999992), (21.100000017, 4.649999992))
            ThreePointArc((21.100000017, 4.649999992), (20.392893235, 4.357106773), (20.100000016, 3.649999992))
            Line((20.100000016, 3.649999992), (20.100000016, 2.000000008))
        make_face(mode=Mode.SUBTRACT)
    extrude(amount=-AUFSATZ_LINEAR_AUSTRAGEN1_DEPTH)


solid = part.part
